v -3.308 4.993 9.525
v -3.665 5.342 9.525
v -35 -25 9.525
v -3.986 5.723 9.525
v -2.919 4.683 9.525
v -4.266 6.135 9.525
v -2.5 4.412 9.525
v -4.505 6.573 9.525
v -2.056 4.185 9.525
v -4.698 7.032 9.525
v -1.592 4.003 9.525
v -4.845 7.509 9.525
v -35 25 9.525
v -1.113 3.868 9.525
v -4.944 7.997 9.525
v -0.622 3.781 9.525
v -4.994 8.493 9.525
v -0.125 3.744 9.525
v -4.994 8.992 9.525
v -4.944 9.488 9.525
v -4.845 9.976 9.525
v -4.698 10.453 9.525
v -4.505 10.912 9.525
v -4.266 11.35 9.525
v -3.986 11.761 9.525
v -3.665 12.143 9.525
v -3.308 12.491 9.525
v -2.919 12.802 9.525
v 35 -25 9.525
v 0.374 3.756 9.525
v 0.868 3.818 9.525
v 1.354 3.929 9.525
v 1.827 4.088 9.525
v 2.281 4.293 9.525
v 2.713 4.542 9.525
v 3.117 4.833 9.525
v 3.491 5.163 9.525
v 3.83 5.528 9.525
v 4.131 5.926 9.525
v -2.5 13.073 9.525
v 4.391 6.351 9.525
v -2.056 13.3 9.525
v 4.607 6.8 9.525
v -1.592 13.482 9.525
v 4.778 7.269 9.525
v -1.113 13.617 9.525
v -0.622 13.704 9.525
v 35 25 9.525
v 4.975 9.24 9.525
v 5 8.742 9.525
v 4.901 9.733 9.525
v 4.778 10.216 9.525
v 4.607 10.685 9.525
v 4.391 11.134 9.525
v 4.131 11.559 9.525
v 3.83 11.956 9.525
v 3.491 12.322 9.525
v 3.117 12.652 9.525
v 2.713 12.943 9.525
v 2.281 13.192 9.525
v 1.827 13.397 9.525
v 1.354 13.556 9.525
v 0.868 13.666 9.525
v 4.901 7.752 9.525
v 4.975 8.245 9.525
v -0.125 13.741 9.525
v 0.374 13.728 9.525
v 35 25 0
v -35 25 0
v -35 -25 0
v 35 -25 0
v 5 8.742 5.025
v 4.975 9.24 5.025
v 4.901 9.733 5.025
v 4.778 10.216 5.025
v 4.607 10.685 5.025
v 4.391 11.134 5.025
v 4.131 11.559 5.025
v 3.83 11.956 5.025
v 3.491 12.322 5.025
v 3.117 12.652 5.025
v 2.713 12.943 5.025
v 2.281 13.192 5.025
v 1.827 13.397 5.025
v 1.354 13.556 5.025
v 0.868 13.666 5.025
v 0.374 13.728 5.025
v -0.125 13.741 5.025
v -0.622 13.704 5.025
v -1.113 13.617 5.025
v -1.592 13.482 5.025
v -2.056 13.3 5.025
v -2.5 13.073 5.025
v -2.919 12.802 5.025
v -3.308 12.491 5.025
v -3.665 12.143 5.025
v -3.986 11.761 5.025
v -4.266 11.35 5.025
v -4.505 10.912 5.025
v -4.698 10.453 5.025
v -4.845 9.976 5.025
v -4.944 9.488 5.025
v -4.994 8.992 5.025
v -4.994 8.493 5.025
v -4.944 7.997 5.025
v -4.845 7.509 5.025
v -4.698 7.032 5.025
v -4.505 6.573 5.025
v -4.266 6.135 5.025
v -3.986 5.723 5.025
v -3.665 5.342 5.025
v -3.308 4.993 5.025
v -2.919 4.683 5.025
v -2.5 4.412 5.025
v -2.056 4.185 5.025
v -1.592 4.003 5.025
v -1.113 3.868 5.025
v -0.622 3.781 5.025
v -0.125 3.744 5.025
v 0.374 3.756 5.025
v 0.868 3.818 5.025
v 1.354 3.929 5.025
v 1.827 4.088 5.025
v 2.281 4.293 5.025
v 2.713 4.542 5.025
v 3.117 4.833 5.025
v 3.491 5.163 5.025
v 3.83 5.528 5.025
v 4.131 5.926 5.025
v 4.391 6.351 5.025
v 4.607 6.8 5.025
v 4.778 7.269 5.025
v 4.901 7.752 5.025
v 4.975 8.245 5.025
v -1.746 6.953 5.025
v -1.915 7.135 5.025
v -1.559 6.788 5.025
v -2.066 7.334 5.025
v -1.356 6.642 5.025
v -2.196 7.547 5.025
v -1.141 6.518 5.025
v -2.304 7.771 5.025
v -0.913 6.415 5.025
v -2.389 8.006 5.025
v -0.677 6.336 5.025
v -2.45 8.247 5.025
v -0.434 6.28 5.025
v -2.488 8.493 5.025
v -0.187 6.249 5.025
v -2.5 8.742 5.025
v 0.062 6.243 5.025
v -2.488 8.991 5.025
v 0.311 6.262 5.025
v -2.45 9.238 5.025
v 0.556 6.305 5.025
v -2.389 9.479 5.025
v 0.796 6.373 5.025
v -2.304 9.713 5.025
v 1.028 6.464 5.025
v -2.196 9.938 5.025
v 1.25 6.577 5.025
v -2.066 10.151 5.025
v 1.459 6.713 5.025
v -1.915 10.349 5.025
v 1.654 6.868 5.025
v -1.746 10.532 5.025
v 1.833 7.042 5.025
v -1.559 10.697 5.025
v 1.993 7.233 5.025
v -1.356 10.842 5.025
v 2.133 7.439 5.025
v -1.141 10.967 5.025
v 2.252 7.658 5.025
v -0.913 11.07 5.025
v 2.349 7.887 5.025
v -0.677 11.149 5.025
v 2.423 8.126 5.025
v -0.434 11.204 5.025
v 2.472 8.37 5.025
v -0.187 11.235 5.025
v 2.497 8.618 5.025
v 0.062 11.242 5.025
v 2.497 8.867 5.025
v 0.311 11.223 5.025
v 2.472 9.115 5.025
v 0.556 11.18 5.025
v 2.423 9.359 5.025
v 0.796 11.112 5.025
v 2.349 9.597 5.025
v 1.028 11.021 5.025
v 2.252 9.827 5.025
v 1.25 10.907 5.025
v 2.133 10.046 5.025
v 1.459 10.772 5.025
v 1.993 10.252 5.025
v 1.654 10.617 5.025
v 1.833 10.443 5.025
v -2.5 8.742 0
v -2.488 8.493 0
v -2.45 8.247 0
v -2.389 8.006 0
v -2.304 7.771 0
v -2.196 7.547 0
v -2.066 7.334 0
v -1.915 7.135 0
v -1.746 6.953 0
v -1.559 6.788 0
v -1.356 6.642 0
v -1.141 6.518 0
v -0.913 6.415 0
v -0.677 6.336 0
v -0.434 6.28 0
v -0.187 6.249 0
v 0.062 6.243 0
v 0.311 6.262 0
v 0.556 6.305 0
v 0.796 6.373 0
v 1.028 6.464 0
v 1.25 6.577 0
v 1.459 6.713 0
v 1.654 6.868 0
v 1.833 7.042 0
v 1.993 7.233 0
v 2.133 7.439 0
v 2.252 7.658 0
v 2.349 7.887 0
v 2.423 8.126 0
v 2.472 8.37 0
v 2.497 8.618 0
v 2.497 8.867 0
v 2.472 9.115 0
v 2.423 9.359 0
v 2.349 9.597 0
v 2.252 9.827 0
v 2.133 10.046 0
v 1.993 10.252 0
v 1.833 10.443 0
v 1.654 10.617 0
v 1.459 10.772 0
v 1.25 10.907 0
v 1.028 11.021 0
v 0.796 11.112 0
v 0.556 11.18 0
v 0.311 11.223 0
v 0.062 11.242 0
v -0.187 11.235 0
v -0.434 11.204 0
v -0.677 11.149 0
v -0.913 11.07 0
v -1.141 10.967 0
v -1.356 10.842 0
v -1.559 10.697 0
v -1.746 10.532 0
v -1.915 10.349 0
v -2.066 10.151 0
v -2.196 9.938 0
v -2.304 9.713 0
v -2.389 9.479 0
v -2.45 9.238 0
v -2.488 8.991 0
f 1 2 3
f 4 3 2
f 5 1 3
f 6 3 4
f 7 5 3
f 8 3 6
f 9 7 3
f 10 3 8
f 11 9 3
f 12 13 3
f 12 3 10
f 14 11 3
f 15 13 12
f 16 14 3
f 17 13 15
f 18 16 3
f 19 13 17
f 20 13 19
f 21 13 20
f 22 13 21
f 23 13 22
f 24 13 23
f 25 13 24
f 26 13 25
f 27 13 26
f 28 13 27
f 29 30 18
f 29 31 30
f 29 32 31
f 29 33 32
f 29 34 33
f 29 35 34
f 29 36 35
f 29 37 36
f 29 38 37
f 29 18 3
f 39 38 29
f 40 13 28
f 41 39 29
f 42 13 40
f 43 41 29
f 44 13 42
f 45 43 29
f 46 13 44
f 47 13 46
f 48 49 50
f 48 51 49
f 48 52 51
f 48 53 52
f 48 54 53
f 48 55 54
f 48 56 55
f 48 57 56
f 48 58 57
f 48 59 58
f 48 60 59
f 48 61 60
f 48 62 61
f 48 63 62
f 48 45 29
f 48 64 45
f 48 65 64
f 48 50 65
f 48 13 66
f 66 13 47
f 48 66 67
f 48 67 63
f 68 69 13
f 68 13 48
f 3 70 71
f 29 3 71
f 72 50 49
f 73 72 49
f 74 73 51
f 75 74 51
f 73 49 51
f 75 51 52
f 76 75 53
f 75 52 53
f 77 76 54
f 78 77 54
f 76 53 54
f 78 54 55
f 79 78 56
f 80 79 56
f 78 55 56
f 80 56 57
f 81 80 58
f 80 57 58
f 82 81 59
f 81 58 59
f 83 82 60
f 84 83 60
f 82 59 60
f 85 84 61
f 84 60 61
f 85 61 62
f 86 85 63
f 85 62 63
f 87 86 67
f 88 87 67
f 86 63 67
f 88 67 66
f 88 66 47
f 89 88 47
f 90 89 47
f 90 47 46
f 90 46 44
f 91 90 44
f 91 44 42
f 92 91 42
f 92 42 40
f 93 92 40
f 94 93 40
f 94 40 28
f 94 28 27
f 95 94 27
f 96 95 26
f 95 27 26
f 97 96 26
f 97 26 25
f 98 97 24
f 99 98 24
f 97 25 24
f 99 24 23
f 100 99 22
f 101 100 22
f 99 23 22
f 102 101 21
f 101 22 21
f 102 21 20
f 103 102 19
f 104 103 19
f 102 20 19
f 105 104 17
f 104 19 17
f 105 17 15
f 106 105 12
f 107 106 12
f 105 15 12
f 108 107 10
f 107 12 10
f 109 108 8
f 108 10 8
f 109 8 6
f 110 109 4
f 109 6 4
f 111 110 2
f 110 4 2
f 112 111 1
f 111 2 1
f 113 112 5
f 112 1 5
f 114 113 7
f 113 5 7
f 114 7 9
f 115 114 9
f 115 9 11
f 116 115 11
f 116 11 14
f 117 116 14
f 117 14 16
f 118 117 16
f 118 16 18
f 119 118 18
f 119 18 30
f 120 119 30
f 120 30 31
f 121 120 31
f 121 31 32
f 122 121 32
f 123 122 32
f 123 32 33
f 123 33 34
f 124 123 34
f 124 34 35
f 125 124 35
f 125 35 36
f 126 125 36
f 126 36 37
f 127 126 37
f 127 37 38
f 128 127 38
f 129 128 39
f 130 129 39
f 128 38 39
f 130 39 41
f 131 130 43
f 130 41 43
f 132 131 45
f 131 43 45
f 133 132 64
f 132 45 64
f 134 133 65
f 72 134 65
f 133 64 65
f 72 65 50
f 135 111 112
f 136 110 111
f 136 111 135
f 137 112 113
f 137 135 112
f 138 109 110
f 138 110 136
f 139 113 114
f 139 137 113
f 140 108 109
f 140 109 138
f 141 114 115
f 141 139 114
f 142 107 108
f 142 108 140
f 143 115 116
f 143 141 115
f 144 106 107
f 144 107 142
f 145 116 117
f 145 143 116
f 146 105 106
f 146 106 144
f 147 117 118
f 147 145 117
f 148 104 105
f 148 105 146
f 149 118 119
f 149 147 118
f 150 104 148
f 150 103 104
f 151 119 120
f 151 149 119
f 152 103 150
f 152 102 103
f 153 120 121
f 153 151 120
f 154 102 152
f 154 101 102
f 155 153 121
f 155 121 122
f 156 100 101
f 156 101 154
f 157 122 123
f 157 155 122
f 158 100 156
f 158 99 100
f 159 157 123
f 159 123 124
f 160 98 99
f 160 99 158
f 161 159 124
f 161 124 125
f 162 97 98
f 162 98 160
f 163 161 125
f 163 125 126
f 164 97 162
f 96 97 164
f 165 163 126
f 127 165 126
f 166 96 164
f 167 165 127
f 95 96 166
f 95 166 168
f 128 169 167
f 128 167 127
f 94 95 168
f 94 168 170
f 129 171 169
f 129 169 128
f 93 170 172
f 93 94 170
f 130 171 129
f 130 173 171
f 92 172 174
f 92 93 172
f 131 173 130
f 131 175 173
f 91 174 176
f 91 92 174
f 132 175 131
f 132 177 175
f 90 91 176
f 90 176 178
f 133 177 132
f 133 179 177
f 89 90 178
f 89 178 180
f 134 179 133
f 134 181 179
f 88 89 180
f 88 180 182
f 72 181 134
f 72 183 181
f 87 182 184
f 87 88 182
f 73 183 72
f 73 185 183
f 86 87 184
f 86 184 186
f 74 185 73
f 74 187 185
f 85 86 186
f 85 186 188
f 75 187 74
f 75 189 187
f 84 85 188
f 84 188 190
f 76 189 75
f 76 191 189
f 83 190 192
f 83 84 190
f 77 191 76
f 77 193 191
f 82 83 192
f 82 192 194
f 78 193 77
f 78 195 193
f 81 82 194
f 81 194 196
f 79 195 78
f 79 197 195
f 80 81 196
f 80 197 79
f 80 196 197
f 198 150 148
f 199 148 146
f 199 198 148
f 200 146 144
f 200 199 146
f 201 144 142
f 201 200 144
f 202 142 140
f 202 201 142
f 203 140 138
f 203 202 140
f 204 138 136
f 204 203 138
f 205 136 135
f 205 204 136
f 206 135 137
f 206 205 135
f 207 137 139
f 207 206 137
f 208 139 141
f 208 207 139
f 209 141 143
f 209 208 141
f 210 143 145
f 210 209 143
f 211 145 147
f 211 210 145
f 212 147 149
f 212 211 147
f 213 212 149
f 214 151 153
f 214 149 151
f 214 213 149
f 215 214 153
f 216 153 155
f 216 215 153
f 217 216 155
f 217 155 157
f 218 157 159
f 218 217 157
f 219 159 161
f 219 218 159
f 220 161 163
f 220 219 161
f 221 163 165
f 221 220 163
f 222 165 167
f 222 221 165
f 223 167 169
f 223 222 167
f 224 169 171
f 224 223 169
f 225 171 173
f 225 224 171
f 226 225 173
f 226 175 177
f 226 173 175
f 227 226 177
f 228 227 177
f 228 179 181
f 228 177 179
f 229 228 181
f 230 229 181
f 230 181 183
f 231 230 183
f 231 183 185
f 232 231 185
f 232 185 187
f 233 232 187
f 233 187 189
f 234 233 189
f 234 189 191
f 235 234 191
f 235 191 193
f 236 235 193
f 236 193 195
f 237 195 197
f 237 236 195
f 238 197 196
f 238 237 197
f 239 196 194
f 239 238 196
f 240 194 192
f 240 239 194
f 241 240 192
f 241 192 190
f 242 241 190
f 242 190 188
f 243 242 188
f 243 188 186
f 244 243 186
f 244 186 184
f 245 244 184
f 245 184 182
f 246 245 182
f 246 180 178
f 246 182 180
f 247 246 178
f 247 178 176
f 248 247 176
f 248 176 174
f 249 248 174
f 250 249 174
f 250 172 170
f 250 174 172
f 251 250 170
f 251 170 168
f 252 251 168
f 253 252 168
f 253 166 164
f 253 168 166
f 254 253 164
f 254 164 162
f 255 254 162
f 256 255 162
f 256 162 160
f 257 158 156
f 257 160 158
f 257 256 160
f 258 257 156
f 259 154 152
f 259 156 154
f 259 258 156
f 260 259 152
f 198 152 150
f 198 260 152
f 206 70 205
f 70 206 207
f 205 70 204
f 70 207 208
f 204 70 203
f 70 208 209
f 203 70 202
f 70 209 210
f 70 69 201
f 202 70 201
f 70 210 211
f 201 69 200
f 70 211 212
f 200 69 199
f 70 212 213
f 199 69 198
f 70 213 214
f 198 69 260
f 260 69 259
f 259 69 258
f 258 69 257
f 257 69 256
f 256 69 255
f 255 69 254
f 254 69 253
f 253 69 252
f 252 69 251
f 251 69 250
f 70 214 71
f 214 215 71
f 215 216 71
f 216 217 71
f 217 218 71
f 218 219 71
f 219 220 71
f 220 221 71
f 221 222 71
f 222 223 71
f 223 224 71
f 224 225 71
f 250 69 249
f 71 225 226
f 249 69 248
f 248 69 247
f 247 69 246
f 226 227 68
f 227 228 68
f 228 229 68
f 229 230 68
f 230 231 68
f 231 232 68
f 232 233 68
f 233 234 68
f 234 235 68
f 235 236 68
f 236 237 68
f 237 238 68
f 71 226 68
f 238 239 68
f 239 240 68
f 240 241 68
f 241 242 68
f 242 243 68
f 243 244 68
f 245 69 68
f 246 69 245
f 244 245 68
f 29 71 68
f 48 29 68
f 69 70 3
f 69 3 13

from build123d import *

# Parameters (mm, degrees)
CROQUIS1_W              = 70
CROQUIS1_H              = 50
CROQUIS1_R              = 2.5
SALIENTE_EXTRUIR1_DEPTH = 9.525
CROQUIS2_R              = 5
CORTAR_EXTRUIR1_DEPTH   = 4.5


with BuildPart() as part:
    # Croquis1 → Saliente-Extruir1 (new body)
    with BuildSketch(Plane.XY):
        Rectangle(CROQUIS1_W, CROQUIS1_H)
        with Locations(Location((0, 8.742399315, 0), (0, 0, 180))):
            Circle(CROQUIS1_R, mode=Mode.SUBTRACT)
    extrude(amount=SALIENTE_EXTRUIR1_DEPTH)

    # Croquis2 → Cortar-Extruir1 (cut)
    with BuildSketch(Plane.XY.offset(9.525)):
        with Locations((0, 8.742399315)):
            Circle(CROQUIS2_R)
    extrude(amount=-CORTAR_EXTRUIR1_DEPTH, mode=Mode.SUBTRACT)


solid = part.part
